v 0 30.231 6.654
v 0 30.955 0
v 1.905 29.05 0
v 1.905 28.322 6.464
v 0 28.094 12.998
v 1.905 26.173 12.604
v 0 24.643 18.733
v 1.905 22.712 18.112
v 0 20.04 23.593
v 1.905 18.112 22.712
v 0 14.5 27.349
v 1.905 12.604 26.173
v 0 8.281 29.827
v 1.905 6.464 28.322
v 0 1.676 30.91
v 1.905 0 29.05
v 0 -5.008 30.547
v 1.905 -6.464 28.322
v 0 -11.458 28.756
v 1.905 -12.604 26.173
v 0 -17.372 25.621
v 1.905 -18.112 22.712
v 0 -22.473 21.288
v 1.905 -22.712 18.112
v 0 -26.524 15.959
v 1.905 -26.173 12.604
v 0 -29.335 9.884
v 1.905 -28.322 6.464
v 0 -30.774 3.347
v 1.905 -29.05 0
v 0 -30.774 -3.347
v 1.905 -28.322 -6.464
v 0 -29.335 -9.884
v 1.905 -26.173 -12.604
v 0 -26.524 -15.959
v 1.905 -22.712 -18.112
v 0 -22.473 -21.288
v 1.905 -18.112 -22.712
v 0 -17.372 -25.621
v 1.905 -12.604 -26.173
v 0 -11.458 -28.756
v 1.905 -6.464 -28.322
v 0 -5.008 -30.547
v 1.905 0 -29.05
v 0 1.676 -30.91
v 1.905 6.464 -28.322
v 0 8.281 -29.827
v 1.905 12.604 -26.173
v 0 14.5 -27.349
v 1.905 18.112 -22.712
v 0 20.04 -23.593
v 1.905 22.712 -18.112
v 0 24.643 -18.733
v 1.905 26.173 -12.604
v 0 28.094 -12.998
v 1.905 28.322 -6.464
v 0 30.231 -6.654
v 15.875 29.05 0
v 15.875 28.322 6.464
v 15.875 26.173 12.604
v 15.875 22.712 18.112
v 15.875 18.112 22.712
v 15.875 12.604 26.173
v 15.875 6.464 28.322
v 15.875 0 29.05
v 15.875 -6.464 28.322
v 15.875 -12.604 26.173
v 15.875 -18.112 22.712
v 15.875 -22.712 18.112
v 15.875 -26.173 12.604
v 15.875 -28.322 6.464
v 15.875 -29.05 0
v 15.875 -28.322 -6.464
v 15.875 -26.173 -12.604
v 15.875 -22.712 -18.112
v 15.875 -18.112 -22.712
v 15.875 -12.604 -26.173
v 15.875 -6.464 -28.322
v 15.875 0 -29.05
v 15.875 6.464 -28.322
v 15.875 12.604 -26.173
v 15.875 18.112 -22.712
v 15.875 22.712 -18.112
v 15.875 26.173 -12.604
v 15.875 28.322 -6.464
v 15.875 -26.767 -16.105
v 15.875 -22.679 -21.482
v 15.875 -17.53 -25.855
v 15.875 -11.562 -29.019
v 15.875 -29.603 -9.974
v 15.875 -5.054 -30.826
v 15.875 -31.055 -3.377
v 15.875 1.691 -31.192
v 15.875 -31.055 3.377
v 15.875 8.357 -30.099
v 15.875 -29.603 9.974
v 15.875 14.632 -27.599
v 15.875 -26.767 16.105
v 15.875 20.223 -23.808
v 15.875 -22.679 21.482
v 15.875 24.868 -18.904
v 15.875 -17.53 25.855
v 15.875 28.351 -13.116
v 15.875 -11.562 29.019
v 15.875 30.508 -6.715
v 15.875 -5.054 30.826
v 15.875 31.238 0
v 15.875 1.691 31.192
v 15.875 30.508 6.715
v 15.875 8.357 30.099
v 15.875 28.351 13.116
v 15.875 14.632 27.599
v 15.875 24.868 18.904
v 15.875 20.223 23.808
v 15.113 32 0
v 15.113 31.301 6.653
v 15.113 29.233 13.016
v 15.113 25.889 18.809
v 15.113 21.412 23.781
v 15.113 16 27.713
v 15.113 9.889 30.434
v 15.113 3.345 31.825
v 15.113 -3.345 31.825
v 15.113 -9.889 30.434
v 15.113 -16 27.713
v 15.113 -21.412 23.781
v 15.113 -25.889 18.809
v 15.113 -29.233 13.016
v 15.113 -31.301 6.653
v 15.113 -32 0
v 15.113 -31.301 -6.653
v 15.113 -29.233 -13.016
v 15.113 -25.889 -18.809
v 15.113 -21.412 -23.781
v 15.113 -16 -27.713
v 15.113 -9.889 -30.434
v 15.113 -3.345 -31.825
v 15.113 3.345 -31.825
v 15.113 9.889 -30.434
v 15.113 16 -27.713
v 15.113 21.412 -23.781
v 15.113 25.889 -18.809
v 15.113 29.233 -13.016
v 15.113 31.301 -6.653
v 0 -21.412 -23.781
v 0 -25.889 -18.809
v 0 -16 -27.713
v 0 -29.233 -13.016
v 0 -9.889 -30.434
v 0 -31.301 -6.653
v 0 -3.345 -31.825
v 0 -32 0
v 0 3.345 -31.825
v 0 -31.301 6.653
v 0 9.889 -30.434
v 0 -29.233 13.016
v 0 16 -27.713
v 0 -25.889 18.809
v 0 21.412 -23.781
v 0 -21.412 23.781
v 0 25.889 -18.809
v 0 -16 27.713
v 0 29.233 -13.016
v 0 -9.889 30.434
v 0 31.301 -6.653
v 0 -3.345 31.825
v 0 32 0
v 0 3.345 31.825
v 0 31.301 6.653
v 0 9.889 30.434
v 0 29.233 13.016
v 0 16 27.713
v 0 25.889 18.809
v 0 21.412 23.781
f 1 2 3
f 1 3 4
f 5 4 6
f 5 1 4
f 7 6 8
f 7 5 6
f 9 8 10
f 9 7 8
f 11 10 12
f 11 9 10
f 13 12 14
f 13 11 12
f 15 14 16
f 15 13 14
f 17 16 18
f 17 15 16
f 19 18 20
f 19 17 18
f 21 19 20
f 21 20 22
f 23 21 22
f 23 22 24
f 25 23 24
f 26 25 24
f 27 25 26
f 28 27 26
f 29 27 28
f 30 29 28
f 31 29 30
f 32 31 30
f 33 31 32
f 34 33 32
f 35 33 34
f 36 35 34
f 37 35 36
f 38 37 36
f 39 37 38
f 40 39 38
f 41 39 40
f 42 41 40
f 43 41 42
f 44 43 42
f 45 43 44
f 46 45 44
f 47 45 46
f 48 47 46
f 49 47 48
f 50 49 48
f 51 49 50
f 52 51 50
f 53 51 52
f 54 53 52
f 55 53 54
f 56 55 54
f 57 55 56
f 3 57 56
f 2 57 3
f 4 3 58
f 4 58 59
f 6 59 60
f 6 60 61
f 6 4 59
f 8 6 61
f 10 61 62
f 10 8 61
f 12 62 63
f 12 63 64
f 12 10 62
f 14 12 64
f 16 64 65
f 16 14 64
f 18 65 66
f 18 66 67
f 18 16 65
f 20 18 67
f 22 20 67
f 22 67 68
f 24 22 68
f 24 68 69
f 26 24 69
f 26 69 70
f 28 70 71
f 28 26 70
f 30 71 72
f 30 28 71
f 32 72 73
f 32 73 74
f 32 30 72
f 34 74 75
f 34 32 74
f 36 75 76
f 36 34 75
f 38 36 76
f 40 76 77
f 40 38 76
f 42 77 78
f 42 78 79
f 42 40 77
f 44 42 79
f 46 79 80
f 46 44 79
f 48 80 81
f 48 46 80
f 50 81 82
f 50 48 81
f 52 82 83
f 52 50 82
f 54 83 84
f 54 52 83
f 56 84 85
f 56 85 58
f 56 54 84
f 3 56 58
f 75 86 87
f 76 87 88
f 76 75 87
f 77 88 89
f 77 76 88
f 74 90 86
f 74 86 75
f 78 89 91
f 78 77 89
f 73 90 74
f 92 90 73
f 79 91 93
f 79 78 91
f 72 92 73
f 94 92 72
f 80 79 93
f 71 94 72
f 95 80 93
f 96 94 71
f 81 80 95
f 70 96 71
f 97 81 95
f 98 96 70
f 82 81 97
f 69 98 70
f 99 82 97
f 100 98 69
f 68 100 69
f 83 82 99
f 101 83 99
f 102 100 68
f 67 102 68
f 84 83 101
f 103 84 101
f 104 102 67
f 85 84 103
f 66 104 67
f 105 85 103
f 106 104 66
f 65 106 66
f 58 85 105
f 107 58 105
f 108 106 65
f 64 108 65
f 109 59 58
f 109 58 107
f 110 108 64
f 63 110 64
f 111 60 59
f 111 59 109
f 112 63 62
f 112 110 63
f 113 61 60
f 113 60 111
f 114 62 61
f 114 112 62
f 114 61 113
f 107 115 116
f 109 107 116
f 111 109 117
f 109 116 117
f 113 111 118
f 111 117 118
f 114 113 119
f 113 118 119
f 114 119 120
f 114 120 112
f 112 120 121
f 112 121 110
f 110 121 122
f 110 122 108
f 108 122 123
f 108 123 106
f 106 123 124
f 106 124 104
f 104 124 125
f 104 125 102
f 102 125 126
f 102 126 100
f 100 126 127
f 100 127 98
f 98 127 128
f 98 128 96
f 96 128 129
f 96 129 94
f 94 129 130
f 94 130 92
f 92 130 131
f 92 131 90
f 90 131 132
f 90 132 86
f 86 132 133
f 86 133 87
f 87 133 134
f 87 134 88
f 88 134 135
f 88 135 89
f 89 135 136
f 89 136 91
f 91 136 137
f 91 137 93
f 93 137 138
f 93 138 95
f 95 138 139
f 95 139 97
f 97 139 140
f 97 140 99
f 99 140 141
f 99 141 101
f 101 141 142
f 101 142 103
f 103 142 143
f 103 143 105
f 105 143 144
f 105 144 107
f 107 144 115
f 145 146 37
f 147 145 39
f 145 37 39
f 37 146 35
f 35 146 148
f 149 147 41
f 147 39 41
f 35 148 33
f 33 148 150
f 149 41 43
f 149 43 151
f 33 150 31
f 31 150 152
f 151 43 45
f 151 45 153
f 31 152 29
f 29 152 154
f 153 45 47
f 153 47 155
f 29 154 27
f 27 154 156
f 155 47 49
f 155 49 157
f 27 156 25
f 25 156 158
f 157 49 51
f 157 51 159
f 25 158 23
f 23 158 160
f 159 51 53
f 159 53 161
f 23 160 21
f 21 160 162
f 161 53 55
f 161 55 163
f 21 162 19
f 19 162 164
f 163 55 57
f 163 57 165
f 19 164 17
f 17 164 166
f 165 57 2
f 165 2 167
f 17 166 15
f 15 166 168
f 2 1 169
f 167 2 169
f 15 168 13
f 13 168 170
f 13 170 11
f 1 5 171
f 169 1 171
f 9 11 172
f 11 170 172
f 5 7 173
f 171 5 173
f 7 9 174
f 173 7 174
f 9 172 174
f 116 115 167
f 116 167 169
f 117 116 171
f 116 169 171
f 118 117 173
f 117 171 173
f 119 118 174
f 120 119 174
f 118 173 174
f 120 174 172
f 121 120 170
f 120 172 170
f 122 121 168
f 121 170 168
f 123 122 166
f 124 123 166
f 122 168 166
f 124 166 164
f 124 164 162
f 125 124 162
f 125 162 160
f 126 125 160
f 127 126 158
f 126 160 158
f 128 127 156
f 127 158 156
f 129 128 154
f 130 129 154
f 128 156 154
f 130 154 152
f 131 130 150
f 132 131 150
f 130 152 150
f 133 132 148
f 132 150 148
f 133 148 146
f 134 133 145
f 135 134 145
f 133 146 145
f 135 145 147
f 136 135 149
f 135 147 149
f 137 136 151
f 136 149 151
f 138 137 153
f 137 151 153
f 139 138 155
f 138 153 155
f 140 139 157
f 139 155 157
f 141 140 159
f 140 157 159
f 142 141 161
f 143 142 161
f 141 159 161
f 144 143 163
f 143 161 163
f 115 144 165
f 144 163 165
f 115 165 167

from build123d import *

# Parameters (mm, degrees)
F0_R     = 32
F0_R_2   = 29.05
F1_DEPTH = 15.875
F2_SIZE  = 1.905
F3_SIZE  = 0.762


with BuildPart() as f1:
    # F0 (on Right) → F1 (new body)
    with BuildSketch(Plane.YZ):
        Circle(F0_R)
        Circle(F0_R_2, mode=Mode.SUBTRACT)
    extrude(amount=F1_DEPTH)

    # F2
    f2_edges = [f1.edges().sort_by_distance(p)[0] for p in [
        (0, -29.05, 0),
    ]]
    chamfer(f2_edges, length=F2_SIZE)

    # F3
    f3_edges = [f1.edges().sort_by_distance(p)[0] for p in [
        (15.875, -32, 0),
    ]]
    chamfer(f3_edges, length=F3_SIZE)


solid = f1.part
